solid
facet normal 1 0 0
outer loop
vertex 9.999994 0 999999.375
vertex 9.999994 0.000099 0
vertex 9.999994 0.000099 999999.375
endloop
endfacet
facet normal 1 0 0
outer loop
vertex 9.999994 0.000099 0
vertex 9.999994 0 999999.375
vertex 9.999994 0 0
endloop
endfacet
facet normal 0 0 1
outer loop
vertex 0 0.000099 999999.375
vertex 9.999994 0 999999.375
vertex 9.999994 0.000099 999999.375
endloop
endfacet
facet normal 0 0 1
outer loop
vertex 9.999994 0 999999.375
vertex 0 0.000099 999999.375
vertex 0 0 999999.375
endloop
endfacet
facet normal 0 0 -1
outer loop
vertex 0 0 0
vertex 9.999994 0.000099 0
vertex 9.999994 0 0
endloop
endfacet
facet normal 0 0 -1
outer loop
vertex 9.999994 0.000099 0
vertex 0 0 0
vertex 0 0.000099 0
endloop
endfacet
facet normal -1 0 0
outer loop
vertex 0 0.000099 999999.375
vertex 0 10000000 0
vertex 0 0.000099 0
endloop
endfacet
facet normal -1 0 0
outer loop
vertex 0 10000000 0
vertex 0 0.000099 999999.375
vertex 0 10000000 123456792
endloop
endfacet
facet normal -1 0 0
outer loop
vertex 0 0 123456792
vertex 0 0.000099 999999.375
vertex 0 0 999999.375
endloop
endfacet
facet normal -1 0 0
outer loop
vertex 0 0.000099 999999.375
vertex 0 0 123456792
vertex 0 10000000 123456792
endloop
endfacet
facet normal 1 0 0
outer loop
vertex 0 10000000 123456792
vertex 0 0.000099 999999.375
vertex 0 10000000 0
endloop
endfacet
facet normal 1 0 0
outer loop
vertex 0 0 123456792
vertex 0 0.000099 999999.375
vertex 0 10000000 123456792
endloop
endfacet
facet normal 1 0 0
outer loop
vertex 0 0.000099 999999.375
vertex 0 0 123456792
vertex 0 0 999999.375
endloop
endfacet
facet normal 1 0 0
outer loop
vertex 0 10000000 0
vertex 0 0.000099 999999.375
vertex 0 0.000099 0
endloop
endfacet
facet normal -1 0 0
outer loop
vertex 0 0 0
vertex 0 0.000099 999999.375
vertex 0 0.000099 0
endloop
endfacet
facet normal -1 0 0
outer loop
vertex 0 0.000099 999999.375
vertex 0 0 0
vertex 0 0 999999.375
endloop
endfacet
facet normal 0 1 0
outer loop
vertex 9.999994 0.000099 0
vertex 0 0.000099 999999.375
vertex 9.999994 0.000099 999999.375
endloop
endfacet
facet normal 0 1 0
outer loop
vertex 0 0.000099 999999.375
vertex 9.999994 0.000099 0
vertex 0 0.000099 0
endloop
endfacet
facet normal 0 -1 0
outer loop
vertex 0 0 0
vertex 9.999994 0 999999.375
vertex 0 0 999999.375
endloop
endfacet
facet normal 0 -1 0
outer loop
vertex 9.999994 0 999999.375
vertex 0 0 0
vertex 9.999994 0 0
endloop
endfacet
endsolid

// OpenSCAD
// Same values as echo_numbers_edge, printed with %g in CSG.
cube([9.999995, 0.00009999995, 999999.4]);
cube([0.000099999, 0.0000099999, 99999.95]);
cube([1e-7, 1e7, 123456789]);
